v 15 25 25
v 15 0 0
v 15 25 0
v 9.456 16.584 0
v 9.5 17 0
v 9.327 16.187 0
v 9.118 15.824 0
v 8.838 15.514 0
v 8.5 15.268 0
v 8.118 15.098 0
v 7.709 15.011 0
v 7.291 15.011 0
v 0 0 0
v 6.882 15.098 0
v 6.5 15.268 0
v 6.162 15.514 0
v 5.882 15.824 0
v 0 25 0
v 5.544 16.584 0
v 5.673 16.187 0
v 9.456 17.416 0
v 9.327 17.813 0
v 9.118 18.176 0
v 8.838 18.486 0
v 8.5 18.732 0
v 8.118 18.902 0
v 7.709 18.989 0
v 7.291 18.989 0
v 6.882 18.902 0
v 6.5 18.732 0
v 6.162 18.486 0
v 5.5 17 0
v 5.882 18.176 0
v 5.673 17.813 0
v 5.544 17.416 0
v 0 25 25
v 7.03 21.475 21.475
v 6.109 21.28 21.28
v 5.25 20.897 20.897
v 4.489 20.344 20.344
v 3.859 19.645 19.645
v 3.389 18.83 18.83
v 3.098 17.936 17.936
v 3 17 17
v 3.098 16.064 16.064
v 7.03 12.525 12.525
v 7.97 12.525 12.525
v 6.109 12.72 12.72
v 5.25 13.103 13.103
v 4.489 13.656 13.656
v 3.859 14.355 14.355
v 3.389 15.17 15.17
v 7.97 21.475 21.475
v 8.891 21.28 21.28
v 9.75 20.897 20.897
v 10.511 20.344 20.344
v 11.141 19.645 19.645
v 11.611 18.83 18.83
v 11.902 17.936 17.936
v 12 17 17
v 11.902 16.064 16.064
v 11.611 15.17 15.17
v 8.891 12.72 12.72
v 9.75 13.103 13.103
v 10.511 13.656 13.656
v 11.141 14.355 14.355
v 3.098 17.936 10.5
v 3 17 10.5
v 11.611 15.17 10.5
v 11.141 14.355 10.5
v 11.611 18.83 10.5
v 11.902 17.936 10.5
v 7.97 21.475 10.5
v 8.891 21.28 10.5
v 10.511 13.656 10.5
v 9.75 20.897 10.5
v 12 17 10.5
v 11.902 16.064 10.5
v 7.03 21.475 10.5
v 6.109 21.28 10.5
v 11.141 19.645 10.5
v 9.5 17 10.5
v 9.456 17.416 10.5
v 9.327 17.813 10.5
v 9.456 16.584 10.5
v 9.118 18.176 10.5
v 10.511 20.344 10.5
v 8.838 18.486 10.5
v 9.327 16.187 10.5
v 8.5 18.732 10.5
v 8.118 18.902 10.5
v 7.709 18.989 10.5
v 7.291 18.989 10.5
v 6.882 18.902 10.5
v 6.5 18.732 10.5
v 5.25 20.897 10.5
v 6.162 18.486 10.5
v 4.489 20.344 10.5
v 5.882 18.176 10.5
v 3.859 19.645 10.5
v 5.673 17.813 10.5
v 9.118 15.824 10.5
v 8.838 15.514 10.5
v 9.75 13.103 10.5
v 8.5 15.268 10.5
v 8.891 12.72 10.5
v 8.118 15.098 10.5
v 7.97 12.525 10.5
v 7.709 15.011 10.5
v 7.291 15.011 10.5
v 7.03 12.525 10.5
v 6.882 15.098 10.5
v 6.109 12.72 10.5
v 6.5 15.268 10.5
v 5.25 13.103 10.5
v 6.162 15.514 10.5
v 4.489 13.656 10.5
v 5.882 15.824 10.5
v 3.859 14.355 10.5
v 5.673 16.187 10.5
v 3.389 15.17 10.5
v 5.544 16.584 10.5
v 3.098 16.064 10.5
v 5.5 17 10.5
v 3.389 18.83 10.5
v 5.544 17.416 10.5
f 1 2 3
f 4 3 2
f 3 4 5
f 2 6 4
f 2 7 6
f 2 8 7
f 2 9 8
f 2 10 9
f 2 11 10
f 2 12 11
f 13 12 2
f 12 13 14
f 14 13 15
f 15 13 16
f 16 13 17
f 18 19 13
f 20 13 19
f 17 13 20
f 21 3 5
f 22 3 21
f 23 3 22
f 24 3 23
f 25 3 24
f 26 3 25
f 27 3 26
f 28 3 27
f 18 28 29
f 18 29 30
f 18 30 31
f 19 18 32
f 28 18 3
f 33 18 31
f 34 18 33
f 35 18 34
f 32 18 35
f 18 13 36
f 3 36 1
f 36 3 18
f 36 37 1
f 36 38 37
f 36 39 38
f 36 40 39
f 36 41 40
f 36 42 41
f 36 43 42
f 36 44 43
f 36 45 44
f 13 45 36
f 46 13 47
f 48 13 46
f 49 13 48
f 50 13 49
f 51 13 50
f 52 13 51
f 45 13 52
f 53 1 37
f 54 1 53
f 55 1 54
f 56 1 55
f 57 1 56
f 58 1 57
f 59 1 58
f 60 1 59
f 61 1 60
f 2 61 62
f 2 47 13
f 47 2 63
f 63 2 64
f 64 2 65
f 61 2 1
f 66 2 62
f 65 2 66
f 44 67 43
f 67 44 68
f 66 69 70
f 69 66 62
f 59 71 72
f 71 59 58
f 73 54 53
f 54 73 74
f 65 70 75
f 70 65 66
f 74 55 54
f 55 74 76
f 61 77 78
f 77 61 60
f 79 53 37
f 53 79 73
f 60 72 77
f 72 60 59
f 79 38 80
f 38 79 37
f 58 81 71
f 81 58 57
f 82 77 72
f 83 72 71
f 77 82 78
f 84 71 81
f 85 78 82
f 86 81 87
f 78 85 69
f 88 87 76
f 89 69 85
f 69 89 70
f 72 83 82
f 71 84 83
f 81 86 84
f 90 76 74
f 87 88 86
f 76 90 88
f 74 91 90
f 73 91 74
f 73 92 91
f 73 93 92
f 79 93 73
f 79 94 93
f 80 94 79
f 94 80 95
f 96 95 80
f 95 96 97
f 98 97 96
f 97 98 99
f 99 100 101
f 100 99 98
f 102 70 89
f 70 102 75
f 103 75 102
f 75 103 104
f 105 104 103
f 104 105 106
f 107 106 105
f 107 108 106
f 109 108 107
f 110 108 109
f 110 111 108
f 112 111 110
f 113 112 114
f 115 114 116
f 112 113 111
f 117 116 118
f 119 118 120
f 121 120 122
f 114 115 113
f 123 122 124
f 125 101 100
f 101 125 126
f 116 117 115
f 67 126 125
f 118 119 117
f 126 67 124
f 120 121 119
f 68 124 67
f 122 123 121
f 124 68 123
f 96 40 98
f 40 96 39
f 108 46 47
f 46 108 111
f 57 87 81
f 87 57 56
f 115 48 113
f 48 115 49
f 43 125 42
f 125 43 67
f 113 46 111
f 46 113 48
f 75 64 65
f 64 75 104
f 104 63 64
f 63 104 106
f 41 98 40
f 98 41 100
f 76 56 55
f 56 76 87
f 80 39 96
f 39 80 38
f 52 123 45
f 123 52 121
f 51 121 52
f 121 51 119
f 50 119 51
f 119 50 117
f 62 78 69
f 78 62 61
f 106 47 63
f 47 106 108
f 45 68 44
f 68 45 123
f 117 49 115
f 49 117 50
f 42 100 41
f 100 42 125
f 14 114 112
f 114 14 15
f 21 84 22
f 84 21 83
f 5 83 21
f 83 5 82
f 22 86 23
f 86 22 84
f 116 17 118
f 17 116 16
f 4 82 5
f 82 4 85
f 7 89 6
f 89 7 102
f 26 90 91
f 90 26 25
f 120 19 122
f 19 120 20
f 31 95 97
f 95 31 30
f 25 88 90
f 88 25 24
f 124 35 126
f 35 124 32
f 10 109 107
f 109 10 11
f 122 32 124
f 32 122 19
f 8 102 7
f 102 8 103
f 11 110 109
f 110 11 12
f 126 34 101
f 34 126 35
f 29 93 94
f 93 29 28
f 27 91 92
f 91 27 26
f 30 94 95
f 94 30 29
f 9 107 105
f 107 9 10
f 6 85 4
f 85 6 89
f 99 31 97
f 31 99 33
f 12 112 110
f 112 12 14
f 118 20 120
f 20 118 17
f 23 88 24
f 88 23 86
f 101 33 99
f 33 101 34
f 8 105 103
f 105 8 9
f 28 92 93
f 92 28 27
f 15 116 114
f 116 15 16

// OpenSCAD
$fn=30;

module screw()
{
  translate([0, 0, 20.5])
    cylinder(r=8/2, h=4);
  cylinder(r=3.5/2, h=24.5);
}

module body()
{
  difference()
  {
    cube([15, 25, 25]);
    rotate([45,0,0])
      translate([-1, 0, 0])
        cube([15+2, 40, 30]);
  }
}

module screw_hole()
{
  translate([0,0,20.5-10])
    cylinder(r=(8+1)/2, h=5+10);
  cylinder(r=(3.5+0.5)/2, h=20.5-10);
}


module main()
{
  difference()
  {
    body();
    translate([15/2, 17, 0])
      screw_hole();
  }
}


main();
%translate([15/2, 17, -10+0.5])
  screw();
